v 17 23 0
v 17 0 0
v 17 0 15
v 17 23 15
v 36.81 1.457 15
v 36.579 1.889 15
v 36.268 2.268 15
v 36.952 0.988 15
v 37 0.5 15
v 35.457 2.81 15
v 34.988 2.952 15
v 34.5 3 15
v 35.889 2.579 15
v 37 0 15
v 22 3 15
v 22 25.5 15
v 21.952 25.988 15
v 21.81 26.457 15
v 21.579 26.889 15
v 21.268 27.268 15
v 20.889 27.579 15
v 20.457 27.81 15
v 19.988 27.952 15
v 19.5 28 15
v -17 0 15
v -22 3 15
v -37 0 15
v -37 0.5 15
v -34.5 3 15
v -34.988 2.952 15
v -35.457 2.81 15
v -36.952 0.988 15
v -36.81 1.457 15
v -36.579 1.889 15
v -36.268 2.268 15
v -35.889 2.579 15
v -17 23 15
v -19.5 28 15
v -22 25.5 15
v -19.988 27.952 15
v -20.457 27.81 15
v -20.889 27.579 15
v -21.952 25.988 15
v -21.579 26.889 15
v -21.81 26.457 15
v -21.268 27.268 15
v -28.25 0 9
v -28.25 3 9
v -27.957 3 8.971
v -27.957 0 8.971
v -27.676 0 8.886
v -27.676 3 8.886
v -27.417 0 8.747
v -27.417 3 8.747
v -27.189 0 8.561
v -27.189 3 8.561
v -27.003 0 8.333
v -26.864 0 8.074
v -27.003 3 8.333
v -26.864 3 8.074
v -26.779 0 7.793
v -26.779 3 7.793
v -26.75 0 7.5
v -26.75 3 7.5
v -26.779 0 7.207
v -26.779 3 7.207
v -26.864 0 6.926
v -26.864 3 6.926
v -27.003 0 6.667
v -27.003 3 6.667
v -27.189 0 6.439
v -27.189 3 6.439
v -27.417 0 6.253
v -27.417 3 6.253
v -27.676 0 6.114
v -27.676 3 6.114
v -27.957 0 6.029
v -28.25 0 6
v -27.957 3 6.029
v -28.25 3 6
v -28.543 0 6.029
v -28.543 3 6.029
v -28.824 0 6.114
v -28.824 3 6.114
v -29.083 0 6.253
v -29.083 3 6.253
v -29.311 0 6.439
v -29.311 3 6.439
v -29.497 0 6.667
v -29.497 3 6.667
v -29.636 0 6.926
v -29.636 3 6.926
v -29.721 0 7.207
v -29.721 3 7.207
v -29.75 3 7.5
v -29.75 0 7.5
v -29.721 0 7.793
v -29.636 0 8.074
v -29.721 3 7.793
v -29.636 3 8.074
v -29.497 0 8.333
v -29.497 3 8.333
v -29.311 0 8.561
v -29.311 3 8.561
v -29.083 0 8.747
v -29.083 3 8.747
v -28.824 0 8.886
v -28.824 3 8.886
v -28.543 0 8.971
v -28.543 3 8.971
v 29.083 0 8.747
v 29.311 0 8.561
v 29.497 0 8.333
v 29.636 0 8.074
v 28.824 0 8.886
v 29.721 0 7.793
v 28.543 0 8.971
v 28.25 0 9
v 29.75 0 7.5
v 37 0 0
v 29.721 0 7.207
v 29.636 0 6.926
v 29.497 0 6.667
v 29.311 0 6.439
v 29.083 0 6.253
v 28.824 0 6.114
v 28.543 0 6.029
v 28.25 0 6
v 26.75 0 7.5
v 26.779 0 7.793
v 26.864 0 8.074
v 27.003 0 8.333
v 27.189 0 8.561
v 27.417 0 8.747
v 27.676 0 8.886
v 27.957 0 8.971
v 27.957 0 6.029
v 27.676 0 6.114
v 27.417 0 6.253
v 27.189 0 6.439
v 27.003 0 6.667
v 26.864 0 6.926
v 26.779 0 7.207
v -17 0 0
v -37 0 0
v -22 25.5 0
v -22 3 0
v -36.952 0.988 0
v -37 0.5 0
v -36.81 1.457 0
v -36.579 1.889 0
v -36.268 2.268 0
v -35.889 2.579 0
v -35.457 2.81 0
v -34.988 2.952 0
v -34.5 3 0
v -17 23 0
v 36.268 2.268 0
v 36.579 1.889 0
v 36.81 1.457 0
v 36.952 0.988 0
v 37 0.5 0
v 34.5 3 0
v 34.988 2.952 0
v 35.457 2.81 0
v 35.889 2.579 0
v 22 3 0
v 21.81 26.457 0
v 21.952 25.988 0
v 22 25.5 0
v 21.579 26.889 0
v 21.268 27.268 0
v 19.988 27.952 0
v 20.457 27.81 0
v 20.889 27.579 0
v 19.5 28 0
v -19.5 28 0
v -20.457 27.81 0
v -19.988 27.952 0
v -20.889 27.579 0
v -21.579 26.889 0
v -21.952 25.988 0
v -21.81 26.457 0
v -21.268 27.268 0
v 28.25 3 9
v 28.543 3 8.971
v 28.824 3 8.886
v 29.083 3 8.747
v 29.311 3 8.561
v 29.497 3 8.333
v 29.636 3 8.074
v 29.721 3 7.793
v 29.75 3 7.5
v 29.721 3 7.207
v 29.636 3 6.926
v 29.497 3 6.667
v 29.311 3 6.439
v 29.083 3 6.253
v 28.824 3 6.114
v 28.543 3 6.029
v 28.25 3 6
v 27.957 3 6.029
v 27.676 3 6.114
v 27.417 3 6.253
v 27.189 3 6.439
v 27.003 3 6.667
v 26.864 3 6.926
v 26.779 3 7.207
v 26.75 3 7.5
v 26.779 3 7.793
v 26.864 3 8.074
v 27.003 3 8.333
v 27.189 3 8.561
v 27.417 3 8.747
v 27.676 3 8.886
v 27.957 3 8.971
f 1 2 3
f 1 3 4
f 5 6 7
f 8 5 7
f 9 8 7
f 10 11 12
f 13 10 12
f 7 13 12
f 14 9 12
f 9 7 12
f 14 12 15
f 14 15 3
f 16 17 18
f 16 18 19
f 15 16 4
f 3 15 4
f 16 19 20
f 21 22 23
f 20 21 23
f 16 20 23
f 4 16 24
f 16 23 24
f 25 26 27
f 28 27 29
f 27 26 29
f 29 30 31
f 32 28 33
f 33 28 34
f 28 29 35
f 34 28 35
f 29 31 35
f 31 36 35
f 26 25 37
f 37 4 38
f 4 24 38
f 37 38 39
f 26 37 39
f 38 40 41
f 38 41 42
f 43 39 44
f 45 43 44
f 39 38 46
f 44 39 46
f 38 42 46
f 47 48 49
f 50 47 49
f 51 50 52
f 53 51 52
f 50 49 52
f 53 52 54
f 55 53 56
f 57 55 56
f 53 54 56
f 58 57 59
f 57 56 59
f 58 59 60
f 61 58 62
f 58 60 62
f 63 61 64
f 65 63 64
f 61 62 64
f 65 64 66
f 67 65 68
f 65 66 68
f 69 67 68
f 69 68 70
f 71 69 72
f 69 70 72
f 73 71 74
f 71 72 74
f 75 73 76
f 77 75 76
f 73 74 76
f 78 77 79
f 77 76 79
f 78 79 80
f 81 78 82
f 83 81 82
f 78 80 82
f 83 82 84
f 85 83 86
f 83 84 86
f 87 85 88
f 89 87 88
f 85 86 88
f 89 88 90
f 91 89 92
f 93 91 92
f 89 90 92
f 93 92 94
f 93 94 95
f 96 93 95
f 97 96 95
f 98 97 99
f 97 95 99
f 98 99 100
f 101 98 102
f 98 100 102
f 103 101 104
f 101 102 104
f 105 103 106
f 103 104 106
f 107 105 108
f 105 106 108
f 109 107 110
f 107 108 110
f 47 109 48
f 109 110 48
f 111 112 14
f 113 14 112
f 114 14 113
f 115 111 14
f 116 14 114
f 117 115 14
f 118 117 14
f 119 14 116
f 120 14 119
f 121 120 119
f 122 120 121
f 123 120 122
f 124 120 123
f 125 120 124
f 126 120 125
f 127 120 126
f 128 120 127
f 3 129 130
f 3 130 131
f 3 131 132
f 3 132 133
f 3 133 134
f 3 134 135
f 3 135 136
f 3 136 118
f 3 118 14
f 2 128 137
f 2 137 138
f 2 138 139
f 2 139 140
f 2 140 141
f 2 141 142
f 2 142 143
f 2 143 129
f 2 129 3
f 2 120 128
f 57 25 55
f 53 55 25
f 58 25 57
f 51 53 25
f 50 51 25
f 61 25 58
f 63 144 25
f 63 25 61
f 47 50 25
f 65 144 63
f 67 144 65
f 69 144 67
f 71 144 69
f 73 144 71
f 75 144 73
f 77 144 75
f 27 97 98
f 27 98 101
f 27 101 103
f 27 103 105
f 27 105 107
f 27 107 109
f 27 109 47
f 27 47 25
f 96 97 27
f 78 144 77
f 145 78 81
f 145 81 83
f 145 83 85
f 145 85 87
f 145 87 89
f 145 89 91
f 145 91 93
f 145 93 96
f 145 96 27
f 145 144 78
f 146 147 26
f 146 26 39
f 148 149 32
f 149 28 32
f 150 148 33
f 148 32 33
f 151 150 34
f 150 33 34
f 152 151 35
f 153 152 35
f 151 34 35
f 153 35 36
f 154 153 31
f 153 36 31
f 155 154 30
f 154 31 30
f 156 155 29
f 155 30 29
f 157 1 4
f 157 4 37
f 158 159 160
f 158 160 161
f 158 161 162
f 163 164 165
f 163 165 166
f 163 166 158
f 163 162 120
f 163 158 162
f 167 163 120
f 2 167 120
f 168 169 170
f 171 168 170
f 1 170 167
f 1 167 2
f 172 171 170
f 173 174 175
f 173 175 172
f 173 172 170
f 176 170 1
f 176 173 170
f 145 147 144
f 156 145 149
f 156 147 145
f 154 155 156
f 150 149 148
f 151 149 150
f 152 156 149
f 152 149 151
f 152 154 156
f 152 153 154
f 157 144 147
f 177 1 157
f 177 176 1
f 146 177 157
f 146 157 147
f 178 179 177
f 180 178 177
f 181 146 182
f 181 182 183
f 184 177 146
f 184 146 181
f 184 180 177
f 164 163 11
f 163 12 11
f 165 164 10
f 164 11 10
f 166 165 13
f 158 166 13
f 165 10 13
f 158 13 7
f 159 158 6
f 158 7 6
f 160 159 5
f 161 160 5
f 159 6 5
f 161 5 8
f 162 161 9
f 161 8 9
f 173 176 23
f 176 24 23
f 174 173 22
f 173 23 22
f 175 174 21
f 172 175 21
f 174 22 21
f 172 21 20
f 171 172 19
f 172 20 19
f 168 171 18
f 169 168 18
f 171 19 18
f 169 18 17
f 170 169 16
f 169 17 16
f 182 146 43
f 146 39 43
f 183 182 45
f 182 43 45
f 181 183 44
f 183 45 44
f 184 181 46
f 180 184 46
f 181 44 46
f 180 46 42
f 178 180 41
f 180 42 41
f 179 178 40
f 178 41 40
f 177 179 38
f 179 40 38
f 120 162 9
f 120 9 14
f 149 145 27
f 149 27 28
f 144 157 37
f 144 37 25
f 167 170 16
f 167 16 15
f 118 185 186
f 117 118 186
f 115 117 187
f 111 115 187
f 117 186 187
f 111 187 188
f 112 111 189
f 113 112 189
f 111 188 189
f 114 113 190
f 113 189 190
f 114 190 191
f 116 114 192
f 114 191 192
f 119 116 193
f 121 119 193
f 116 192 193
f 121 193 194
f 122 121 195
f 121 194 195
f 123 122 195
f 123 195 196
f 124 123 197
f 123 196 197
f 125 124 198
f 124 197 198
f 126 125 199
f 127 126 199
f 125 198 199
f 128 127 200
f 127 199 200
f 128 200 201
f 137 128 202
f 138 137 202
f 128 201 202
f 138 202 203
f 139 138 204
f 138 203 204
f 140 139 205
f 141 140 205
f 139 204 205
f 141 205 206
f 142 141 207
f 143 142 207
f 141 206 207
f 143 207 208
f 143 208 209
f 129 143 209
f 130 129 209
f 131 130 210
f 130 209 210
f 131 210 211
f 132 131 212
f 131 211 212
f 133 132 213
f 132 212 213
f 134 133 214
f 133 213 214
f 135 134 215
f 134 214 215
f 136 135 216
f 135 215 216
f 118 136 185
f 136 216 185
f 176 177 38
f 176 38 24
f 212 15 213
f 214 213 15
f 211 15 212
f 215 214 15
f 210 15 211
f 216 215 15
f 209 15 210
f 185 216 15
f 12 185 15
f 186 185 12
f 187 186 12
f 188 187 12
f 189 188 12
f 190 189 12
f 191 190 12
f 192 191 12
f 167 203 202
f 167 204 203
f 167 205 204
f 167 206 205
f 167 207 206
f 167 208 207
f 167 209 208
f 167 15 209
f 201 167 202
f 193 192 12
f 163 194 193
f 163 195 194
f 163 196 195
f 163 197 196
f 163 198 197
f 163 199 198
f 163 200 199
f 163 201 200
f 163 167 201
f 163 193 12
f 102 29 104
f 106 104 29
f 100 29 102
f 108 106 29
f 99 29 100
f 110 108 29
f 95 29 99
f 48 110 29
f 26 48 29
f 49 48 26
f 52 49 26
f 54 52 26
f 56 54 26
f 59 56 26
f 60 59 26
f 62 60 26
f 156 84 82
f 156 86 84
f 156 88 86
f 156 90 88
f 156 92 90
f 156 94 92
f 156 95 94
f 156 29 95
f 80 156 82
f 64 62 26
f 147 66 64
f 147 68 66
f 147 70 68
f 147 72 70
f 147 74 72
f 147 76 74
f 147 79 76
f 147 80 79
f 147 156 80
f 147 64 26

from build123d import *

# Parameters (mm, degrees)
BOSS_EXTRUDE1_DEPTH = 15
FILLET1_R           = 2.5
SKETCH2_R           = 1.5
CUT_EXTRUDE1_DEPTH  = 3


with BuildPart() as part:
    # Sketch1 → Boss-Extrude1 (new body)
    with BuildSketch(Plane.XY):
        Polygon((17, 23), (-17, 23), (-17, 0), (-37, 0), (-37, 3), (-22, 3), (-22, 28), (22, 28), (22, 3), (37, 3), (37, 0), (17, 0), align=None)
    extrude(amount=BOSS_EXTRUDE1_DEPTH)

    # Fillet1
    fillet1_edges = [part.edges().sort_by_distance(p)[0] for p in [
        (-37, 3, 7.5),
        (-22, 28, 7.5),
        (22, 28, 7.5),
        (37, 3, 7.5),
    ]]
    fillet(fillet1_edges, radius=FILLET1_R)

    # Sketch2 → Cut-Extrude1 (cut)
    with BuildSketch(Plane(origin=(0, 3, 0), x_dir=(1, 0, 0), z_dir=(0, 1, 0))):
        with Locations(Location((-28.25, -7.5, 0), (0, 0, 270))):
            Circle(SKETCH2_R)
        with Locations(Location((28.25, -7.5, 0), (0, 0, 270))):
            Circle(SKETCH2_R)
    extrude(amount=-CUT_EXTRUDE1_DEPTH, mode=Mode.SUBTRACT)


solid = part.part
